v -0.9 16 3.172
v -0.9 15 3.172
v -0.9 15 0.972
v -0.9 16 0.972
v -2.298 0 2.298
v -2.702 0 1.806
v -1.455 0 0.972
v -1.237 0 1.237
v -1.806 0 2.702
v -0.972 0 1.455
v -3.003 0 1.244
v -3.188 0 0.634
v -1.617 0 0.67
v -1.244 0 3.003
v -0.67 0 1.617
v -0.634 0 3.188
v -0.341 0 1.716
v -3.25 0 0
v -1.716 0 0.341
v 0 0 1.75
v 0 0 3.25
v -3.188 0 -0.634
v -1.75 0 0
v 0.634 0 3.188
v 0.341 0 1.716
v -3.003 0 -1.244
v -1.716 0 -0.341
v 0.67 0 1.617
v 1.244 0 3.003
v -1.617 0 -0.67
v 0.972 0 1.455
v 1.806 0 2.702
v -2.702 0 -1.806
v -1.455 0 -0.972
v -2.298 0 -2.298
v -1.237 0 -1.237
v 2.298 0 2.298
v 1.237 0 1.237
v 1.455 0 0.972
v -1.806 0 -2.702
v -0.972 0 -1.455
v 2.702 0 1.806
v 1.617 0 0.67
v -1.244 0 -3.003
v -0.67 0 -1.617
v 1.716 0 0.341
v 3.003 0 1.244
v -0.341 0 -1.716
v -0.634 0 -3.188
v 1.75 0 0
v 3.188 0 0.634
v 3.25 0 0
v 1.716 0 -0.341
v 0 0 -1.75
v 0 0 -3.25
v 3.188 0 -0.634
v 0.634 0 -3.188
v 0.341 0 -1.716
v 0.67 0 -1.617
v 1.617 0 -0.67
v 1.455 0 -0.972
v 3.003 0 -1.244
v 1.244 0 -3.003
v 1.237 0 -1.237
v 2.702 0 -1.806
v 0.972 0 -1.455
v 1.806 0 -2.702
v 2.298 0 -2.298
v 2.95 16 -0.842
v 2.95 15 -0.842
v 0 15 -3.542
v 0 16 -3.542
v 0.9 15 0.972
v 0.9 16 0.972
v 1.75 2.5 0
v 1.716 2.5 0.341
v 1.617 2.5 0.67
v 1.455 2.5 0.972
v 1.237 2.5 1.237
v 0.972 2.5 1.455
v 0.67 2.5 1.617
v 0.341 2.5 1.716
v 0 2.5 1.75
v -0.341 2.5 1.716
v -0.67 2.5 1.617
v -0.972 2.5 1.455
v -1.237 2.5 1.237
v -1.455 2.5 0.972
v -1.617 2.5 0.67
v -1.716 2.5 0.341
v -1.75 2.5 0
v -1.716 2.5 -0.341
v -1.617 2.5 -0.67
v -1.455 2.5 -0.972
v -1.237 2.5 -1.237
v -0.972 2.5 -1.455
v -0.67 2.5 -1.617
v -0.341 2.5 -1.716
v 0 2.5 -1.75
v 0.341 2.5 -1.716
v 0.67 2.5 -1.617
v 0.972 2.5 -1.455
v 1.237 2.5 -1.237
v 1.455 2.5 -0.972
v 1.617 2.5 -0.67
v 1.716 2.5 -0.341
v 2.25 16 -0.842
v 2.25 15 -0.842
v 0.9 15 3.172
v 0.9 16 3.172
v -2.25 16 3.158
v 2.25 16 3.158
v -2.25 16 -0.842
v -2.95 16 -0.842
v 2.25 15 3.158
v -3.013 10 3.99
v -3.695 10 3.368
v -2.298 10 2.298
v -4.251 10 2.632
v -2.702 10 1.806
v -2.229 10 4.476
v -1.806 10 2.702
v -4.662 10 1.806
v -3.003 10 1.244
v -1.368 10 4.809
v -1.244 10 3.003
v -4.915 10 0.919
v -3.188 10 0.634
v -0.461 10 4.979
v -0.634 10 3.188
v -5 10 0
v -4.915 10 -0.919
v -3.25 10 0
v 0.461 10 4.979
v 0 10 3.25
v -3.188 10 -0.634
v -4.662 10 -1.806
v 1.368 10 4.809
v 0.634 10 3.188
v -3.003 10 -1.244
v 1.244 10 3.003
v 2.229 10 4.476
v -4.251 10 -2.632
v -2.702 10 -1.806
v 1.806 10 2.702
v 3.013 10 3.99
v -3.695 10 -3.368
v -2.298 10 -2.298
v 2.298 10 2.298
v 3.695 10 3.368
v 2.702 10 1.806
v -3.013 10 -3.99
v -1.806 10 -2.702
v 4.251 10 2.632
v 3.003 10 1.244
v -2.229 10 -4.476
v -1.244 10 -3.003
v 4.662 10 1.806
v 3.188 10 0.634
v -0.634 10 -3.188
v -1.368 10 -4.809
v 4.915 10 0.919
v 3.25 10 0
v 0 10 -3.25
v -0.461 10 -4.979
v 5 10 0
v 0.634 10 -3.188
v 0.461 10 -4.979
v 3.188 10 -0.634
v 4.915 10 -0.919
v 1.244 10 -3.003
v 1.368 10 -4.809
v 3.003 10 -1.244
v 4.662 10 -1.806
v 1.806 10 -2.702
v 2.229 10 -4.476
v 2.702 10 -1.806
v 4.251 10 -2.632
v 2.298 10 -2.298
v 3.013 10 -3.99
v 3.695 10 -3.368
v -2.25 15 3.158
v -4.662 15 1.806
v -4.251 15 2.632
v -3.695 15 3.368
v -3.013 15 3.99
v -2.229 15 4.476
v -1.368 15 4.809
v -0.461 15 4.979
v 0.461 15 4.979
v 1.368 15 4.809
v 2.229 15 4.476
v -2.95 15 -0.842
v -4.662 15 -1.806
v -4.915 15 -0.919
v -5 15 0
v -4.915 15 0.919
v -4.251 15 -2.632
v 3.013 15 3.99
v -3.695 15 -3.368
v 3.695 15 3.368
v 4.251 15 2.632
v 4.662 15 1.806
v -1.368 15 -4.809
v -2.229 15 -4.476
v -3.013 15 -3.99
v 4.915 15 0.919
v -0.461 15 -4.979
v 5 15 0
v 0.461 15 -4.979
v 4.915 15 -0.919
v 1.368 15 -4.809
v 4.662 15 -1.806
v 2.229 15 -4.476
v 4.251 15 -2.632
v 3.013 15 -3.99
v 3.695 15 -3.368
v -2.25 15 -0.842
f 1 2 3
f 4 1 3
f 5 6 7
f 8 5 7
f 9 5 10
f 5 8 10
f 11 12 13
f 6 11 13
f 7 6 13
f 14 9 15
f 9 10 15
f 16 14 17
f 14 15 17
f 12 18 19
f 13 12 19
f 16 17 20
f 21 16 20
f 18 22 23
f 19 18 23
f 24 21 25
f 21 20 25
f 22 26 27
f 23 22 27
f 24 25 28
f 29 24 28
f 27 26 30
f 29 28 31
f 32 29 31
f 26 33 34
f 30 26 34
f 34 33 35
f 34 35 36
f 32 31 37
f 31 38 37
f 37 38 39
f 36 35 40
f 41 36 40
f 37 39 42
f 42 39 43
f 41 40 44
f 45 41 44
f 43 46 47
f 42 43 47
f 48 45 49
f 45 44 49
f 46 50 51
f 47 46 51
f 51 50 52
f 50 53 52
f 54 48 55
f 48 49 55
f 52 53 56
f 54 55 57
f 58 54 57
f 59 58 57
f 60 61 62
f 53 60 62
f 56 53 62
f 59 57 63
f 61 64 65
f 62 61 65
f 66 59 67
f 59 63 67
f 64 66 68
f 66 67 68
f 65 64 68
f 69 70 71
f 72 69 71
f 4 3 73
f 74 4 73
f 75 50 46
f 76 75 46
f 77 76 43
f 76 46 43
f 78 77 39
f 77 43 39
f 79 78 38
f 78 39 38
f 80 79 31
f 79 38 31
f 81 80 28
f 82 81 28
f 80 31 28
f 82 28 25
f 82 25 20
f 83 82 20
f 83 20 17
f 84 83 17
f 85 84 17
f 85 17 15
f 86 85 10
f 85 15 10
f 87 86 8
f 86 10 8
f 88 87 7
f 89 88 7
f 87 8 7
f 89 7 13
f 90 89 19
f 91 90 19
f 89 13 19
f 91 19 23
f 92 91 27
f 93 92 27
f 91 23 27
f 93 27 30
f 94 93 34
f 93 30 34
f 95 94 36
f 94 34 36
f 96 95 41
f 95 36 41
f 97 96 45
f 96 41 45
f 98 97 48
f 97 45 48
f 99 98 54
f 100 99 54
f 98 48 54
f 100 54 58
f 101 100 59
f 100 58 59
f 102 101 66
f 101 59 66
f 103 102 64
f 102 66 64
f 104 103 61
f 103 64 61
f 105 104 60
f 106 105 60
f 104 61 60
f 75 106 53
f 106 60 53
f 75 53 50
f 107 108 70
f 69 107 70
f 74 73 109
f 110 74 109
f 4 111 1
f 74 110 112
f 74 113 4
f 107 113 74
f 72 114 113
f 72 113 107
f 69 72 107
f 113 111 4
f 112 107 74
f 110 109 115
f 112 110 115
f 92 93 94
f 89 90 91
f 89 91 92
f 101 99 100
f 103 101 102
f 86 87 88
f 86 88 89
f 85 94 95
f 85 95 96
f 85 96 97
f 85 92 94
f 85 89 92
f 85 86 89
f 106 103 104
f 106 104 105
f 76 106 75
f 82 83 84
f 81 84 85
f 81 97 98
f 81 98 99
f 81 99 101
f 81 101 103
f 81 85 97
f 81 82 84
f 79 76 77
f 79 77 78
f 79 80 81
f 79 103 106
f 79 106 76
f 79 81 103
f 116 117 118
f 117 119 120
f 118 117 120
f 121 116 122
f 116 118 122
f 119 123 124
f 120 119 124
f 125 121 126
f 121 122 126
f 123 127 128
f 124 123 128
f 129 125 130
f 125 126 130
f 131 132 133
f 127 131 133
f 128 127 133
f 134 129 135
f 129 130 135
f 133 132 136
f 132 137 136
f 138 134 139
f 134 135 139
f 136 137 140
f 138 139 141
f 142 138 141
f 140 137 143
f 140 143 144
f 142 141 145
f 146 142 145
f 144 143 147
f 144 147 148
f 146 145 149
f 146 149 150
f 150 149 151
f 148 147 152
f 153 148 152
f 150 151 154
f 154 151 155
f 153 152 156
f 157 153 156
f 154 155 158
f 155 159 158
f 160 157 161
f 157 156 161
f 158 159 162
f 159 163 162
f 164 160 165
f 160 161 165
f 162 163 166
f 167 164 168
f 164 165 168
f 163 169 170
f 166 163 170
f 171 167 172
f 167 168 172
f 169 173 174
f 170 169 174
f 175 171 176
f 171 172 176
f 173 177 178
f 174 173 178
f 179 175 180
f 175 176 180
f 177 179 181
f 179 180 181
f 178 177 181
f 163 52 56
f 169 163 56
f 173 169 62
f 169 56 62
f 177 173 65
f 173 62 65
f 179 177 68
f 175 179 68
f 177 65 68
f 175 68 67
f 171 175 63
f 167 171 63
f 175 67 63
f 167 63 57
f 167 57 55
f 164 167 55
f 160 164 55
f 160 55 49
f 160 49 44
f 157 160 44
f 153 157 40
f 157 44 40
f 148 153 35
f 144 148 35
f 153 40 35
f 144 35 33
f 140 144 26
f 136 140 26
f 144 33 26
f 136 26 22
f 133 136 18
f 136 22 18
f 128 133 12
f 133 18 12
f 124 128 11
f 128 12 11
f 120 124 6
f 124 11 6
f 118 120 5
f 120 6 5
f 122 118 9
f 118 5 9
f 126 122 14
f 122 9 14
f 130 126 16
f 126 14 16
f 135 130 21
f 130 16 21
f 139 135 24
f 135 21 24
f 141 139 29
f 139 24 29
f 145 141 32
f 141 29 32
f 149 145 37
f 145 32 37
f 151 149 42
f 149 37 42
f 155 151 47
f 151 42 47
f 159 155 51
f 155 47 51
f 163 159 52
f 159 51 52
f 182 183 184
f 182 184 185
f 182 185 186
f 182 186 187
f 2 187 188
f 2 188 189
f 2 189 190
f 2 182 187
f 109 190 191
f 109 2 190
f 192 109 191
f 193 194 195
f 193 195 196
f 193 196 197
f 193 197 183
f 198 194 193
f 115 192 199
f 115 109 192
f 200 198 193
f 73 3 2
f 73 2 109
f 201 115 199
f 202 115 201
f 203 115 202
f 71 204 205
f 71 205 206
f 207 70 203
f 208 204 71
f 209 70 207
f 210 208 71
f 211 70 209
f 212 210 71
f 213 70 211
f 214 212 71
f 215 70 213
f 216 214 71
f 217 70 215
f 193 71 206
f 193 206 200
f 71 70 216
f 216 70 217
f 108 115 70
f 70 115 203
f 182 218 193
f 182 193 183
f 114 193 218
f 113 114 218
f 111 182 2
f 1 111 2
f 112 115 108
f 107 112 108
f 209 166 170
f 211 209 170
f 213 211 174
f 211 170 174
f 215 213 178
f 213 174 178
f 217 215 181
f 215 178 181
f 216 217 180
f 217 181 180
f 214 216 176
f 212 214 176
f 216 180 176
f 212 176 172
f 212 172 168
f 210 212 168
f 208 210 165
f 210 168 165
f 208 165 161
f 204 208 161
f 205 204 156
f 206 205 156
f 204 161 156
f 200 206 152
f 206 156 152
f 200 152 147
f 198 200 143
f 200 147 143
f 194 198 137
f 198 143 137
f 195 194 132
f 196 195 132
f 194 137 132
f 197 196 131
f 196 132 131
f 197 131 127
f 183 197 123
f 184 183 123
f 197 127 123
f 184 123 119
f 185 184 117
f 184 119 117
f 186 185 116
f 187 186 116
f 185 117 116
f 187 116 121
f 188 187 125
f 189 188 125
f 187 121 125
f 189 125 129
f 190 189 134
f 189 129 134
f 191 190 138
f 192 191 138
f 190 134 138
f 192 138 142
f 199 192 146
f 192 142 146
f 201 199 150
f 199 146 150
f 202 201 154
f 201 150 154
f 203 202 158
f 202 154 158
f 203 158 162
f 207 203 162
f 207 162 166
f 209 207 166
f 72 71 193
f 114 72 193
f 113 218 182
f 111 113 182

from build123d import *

# Parameters (mm, degrees)
SKETCH1_R           = 3.25
BOSS_EXTRUDE1_DEPTH = 10
SKETCH2_R           = 1.75
CUT_EXTRUDE1_DEPTH  = 2.5
SKETCH6_R           = 5
BOSS_EXTRUDE2_DEPTH = 5
BOSS_EXTRUDE3_DEPTH = 1


with BuildPart() as part:
    # Sketch1 → Boss-Extrude1 (new body)
    with BuildSketch(Plane(origin=(0, 0, 0), x_dir=(1, 0, 0), z_dir=(0, 1, 0))):
        Circle(SKETCH1_R)
    extrude(amount=BOSS_EXTRUDE1_DEPTH)

    # Sketch2 → Cut-Extrude1 (cut)
    with BuildSketch(Plane.XZ):
        Circle(SKETCH2_R)
    extrude(amount=-CUT_EXTRUDE1_DEPTH, mode=Mode.SUBTRACT)

    # Sketch6 → Boss-Extrude2 (add)
    with BuildSketch(Plane(origin=(0, 10, 0), x_dir=(1, 0, 0), z_dir=(0, 1, 0))):
        Circle(SKETCH6_R)
    extrude(amount=BOSS_EXTRUDE2_DEPTH)

    # Sketch12 → Boss-Extrude3 (add)
    with BuildSketch(Plane(origin=(0, 15, 0), x_dir=(1, 0, 0), z_dir=(0, 1, 0))):
        Polygon((0, 3.542487974), (-2.95, 0.842487974), (-2.25, 0.842487974), (-2.25, -3.157512026), (-0.9, -3.172366953), (-0.9, -0.972366953), (0.9, -0.972366953), (0.9, -3.172366953), (2.25, -3.157512026), (2.25, 0.842487974), (2.95, 0.842487974), align=None)
    extrude(amount=BOSS_EXTRUDE3_DEPTH)


solid = part.part
